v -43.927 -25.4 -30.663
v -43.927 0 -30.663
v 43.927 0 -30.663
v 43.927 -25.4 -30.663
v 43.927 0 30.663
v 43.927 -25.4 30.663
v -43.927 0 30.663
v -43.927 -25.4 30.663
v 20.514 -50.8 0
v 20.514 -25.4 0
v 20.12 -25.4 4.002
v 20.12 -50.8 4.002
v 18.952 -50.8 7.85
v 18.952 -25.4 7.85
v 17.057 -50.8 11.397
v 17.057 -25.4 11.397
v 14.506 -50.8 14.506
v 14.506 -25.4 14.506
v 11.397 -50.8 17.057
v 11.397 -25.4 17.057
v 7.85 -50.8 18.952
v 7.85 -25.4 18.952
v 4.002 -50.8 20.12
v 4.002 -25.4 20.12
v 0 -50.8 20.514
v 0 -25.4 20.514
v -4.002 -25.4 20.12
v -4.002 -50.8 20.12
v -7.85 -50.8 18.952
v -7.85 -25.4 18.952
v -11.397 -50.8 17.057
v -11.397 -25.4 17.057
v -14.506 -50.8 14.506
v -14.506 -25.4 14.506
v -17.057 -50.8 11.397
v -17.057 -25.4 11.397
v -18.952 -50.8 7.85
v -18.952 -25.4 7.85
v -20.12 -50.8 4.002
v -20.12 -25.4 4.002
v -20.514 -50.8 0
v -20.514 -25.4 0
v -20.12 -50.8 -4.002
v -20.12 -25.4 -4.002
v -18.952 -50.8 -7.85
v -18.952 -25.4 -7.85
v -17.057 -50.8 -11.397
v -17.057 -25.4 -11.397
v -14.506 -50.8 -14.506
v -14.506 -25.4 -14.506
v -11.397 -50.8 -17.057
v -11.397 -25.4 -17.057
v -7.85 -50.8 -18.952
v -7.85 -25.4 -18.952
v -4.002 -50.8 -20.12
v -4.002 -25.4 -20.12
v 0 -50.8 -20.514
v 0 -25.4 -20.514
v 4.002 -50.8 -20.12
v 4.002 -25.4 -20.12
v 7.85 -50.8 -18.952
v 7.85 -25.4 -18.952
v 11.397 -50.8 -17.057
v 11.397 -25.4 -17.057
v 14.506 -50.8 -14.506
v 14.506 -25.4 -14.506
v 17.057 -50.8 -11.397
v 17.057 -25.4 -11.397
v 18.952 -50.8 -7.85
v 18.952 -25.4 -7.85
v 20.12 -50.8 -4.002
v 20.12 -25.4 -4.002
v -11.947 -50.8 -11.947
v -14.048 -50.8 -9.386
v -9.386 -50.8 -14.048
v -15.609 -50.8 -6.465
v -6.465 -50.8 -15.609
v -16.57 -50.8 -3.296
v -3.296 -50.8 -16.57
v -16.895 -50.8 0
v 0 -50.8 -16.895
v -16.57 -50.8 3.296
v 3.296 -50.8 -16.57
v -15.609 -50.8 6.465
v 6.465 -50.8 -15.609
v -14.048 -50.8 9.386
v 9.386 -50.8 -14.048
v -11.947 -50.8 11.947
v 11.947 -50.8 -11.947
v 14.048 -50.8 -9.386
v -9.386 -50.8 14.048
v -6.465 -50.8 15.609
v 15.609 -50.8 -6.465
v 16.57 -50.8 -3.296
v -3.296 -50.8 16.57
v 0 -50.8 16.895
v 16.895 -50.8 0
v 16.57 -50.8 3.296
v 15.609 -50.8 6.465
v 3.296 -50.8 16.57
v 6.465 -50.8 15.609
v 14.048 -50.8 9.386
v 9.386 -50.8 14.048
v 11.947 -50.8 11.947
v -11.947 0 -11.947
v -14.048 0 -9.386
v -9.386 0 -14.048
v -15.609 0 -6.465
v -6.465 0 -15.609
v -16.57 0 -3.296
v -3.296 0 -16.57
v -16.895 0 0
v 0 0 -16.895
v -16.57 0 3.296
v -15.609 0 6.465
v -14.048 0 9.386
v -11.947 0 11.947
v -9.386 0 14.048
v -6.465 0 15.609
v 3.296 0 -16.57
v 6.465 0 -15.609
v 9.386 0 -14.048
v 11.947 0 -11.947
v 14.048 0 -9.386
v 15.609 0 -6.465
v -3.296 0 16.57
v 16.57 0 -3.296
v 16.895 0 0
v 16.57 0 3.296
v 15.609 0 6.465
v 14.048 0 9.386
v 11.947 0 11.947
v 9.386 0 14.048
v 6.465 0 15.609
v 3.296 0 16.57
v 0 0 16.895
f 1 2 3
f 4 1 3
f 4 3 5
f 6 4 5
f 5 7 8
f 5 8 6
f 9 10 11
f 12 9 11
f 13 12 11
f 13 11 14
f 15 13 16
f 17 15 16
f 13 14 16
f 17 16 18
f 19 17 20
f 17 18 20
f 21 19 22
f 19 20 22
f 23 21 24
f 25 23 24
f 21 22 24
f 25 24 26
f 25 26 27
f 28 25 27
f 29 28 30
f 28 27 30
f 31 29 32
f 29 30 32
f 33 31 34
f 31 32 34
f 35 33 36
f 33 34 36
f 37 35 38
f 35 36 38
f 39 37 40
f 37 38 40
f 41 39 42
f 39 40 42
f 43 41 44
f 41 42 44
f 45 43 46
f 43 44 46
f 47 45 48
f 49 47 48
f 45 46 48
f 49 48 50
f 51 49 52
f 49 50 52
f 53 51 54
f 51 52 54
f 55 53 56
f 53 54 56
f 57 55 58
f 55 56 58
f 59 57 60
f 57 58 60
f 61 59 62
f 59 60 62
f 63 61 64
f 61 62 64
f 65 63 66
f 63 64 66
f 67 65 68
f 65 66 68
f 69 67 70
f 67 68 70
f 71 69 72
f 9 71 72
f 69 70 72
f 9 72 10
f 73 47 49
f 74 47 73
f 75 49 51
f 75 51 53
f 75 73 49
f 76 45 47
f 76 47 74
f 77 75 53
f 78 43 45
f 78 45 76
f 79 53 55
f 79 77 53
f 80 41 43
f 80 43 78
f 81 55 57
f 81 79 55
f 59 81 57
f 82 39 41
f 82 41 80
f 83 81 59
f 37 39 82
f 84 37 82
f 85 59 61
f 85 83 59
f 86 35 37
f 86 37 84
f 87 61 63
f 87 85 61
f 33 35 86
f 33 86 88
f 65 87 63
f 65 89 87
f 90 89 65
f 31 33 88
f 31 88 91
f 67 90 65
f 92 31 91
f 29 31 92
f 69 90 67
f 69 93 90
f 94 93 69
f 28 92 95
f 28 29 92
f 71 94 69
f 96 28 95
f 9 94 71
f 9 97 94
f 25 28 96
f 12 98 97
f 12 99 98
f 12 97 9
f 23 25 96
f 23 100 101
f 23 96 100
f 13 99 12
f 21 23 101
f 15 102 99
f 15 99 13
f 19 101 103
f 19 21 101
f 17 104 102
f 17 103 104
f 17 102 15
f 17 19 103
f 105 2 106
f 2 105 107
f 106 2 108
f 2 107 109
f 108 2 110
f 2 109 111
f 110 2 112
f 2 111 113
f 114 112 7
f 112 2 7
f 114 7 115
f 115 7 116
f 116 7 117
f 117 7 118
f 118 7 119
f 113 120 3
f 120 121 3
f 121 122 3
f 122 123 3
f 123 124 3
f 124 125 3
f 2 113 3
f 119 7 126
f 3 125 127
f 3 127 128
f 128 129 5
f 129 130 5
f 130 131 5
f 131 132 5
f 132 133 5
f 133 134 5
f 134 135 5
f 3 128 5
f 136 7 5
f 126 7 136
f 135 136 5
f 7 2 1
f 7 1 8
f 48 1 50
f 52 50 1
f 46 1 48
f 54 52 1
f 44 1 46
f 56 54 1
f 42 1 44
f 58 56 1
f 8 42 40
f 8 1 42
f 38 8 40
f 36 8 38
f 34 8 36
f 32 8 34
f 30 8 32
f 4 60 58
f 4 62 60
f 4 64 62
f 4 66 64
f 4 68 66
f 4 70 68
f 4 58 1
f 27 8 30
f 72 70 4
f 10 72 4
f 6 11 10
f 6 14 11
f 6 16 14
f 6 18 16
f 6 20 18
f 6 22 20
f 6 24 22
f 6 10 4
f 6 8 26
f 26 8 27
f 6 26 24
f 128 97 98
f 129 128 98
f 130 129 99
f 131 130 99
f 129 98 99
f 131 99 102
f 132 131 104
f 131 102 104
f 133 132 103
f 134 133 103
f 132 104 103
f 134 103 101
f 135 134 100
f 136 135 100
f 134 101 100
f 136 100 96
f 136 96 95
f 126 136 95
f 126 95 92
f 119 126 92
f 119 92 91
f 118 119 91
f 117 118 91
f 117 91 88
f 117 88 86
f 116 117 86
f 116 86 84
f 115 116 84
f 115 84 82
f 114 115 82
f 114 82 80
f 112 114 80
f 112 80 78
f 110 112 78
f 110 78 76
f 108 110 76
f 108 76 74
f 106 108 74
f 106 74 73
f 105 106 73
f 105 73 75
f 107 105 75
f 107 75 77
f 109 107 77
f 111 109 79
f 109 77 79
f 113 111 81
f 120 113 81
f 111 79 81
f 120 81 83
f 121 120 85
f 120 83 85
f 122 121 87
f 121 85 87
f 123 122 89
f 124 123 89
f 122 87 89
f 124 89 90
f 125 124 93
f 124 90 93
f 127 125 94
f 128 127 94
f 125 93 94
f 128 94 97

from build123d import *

# Parameters (mm, degrees)
F0_W     = 87.854118
F0_H     = 61.326738
F1_DEPTH = 25.4
F2_R     = 20.514038
F3_DEPTH = 25.4
F4_R     = 15.848833
F5_DEPTH = 50.8
F6_R     = 16.894941
F7_DEPTH = 76.2


with BuildPart() as f1:
    # F0 (on Front) → F1 (new body)
    with BuildSketch(Plane.XZ):
        Rectangle(F0_W, F0_H)
    extrude(amount=F1_DEPTH)

    # F2 (on face) → F3 (join)
    with BuildSketch(Plane.XZ.offset(25.4)):
        Circle(F2_R)
    extrude(amount=F3_DEPTH)

    # F4 (on Front) → F5 (cut)
    with BuildSketch(Plane.XZ):
        Circle(F4_R)
    extrude(amount=-F5_DEPTH, mode=Mode.SUBTRACT)

    # F6 (on face) → F7 (cut)
    with BuildSketch(Plane.XZ.offset(50.8)):
        Circle(F6_R)
    extrude(amount=-F7_DEPTH, mode=Mode.SUBTRACT)


solid = f1.part
